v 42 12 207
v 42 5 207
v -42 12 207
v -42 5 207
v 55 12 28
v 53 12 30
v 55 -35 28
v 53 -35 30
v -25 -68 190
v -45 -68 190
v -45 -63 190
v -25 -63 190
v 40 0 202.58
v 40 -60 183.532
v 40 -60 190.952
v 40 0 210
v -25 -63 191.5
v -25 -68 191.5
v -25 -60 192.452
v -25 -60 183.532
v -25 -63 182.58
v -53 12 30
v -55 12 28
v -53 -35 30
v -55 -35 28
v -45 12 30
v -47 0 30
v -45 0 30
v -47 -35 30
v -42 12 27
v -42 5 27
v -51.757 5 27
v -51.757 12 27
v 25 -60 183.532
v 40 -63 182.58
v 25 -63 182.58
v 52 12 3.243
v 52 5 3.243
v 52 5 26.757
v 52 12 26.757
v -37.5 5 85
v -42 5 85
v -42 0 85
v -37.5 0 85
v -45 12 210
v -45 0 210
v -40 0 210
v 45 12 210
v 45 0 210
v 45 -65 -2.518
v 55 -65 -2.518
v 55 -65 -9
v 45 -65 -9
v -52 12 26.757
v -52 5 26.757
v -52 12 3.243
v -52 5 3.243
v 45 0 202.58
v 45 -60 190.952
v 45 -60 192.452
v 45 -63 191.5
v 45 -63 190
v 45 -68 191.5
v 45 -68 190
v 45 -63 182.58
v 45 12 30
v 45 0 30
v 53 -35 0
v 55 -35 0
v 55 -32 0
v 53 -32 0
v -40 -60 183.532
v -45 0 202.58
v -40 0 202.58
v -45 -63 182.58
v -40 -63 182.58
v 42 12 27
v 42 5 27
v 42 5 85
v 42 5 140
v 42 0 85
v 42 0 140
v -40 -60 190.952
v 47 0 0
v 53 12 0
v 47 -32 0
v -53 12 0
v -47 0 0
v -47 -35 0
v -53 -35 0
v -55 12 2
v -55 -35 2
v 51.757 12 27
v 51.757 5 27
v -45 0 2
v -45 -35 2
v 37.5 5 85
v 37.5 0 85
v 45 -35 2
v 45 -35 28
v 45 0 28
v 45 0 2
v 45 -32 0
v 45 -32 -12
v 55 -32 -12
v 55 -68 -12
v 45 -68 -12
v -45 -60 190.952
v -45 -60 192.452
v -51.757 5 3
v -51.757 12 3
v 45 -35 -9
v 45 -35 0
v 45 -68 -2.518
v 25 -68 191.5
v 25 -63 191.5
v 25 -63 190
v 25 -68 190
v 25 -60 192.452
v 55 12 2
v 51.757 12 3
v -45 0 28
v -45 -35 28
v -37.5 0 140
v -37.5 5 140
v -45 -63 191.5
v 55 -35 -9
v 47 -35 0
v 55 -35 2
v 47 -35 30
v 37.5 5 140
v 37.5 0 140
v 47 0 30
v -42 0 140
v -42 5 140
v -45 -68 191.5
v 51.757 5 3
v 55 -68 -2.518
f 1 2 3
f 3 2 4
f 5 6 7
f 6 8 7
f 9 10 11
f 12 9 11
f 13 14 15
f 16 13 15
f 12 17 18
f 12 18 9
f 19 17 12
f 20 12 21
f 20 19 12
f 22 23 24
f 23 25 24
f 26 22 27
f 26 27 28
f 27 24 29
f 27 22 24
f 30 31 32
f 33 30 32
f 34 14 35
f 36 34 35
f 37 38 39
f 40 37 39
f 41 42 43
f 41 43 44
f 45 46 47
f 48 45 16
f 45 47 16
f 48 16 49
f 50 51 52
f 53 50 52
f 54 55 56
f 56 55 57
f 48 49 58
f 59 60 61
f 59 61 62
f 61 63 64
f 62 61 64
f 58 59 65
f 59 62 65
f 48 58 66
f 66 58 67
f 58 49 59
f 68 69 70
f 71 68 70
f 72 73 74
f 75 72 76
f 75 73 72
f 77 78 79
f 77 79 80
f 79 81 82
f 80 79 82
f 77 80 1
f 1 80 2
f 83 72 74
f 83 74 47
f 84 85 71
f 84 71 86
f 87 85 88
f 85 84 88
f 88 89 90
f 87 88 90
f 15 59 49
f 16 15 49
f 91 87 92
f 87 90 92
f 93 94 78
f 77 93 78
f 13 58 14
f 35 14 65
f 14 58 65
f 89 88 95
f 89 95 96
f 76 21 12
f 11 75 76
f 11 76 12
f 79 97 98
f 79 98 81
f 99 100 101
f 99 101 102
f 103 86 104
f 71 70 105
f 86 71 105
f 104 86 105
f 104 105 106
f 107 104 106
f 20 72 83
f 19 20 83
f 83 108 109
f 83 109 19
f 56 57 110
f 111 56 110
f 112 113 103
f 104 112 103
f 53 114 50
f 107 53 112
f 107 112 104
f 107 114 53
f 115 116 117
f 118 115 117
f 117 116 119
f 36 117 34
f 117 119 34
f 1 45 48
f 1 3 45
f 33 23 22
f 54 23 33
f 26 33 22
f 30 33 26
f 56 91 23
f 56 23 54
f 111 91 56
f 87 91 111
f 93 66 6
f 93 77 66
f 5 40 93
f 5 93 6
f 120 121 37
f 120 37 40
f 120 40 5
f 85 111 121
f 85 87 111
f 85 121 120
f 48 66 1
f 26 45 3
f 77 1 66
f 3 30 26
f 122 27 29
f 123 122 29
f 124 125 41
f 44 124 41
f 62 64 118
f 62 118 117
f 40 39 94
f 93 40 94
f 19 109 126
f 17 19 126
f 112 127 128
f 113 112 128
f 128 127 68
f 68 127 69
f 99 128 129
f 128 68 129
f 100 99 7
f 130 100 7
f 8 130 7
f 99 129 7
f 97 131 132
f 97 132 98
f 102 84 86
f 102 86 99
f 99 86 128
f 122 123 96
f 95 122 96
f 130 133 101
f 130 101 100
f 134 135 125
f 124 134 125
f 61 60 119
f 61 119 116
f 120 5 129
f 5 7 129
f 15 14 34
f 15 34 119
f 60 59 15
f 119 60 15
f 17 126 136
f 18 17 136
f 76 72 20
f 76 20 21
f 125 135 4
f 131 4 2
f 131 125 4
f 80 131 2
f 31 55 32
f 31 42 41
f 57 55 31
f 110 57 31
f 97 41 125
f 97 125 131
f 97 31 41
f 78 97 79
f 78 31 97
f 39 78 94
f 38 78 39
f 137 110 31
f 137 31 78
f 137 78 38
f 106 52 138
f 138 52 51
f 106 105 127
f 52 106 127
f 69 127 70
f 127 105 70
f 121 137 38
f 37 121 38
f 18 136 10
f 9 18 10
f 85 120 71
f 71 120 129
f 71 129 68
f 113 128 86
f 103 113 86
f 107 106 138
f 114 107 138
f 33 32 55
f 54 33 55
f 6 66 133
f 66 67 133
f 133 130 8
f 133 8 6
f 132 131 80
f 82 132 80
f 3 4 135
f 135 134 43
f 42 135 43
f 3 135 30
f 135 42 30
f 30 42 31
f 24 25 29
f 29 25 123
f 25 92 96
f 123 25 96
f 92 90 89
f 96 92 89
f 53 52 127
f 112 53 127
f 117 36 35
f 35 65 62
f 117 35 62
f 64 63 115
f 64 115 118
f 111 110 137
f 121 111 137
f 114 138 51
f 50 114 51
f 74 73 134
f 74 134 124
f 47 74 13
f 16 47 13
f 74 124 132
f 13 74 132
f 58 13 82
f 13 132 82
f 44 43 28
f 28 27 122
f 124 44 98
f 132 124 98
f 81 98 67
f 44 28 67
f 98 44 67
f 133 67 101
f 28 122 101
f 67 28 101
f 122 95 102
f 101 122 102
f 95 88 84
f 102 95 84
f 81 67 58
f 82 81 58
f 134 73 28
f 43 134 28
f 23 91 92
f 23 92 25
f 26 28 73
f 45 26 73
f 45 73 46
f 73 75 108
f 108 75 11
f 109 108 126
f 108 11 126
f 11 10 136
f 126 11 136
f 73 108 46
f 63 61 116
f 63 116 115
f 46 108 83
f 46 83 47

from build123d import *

# Parameters (mm, degrees)
BOSS_EXTRUDE1_DEPTH = 5
SKETCH2_W           = 4.5
SKETCH2_H           = 55
CUT_EXTRUDE1_DEPTH  = 198.863589374
BOSS_EXTRUDE2_START = -5
SKETCH3_W           = 10
SKETCH3_H           = 30
BOSS_EXTRUDE2_DEPTH = 35
CHAMFER1_SIZE       = 2
SKETCH5_W           = 90
SKETCH5_H           = 5
BOSS_EXTRUDE3_DEPTH = 20
BOSS_EXTRUDE4_DEPTH = 5
BOSS_EXTRUDE5_DEPTH = 15
BOSS_EXTRUDE6_DEPTH = 20
BOSS_EXTRUDE7_DEPTH = 7
BOSS_EXTRUDE8_REACH = 248.625


with BuildPart() as part:
    # Sketch1 → Boss-Extrude1 (new body)
    with BuildSketch(Plane(origin=(0, 0, 0), x_dir=(1, 0, 0), z_dir=(0, 1, 0))):
        Polygon((-45, -30), (-45, -190), (45, -190), (45, -30), (55, -30), (55, 0), (-55, 0), (-55, -30), align=None)
    extrude(amount=BOSS_EXTRUDE1_DEPTH)

    # Sketch2 → Cut-Extrude1 (cut, through all)
    with BuildSketch(Plane(origin=(0, 5, 0), x_dir=(1, 0, 0), z_dir=(0, 1, 0))):
        with Locations((39.75, -112.5)):
            Rectangle(SKETCH2_W, SKETCH2_H)
        with Locations((-39.75, -112.5)):
            Rectangle(SKETCH2_W, SKETCH2_H)
    extrude(amount=-CUT_EXTRUDE1_DEPTH, mode=Mode.SUBTRACT)

    # Sketch3 → Boss-Extrude2 (add)
    with BuildSketch(Plane(origin=(0, 5, 0), x_dir=(1, 0, 0), z_dir=(0, 1, 0)).offset(BOSS_EXTRUDE2_START)):
        with Locations((50, -15)):
            Rectangle(SKETCH3_W, SKETCH3_H)
        with Locations((-50, -15)):
            Rectangle(SKETCH3_W, SKETCH3_H)
    extrude(amount=-BOSS_EXTRUDE2_DEPTH)

    # Chamfer1
    chamfer1_edges = [part.edges().sort_by_distance(p)[0] for p in [
        (-55, -15, 30),
        (-55, -15, 0),
        (55, -15, 0),
        (55, -15, 30),
        (45, -17.5, 30),
        (45, -17.5, 0),
        (-45, -17.5, 0),
        (-45, -17.5, 30),
    ]]
    chamfer(chamfer1_edges, length=CHAMFER1_SIZE)

    # Sketch5 → Boss-Extrude3 (add)
    with BuildSketch(Plane.XY.offset(190)):
        with Locations((0, 2.5)):
            Rectangle(SKETCH5_W, SKETCH5_H)
    extrude(amount=BOSS_EXTRUDE3_DEPTH)

    # Sketch8 → Boss-Extrude4 (add)
    with BuildSketch(Plane.ZY.offset(45)):
        Polygon((202.579910044, 0), (182.579910044, -63), (190, -63), (210, 0), align=None)
    boss_extrude4 = extrude(amount=-BOSS_EXTRUDE4_DEPTH)

    # Sketch9 → Boss-Extrude5 (add)
    with BuildSketch(Plane(origin=(-40, 0, 0), x_dir=(0, 0, -1), z_dir=(1, 0, 0))):
        Polygon((-190.952380952, -60), (-183.532290996, -60), (-182.579910044, -63), (-190, -63), align=None)
    boss_extrude5 = extrude(amount=BOSS_EXTRUDE5_DEPTH)

    # Sketch10 → Boss-Extrude6 (add)
    with BuildSketch(Plane.ZY.offset(45)):
        Polygon((190, -68), (190, -63), (190.952380952, -60), (192.452380952, -60), (191.5, -63), (191.5, -68), align=None)
    boss_extrude6 = extrude(amount=-BOSS_EXTRUDE6_DEPTH)

    # Mirror1: Boss-Extrude4, Boss-Extrude5, Boss-Extrude6 across plane
    add(boss_extrude4.mirror(Plane(origin=(0, 0, 0), x_dir=(0, 0, 1), z_dir=(1, 0, 0))))
    add(boss_extrude5.mirror(Plane(origin=(0, 0, 0), x_dir=(0, 0, 1), z_dir=(1, 0, 0))))
    add(boss_extrude6.mirror(Plane(origin=(0, 0, 0), x_dir=(0, 0, 1), z_dir=(1, 0, 0))))

    # Sketch11 → Boss-Extrude7 (add)
    with BuildSketch(Plane(origin=(0, 5, 0), x_dir=(1, 0, 0), z_dir=(0, 1, 0))):
        Polygon((45, -210), (45, -30), (53, -30), (55, -28), (55, -2), (53, 0), (-53, 0), (-55, -2), (-55, -28), (-53, -30), (-45, -30), (-45, -210), align=None)
        Polygon((51.757359313, -27), (42, -27), (42, -85), (42, -140), (42, -207), (-42, -207), (-42, -140), (-42, -85), (-42, -27), (-51.757359313, -27), (-52, -26.757359313), (-52, -3.242640687), (-51.757359313, -3), (51.757359313, -3), (52, -3.242640687), (52, -26.757359313), align=None, mode=Mode.SUBTRACT)
    extrude(amount=BOSS_EXTRUDE7_DEPTH)

    # Boss-Extrude8: up to this face of the body (flat: up to its plane)
    boss_extrude8_end = Plane(part.part.faces().sort_by_distance((45, -17.5, 15))[0])
    # Sketch12 → Boss-Extrude8 (add, up to the picked face)
    with BuildSketch(Plane(origin=(55, 0, 0), x_dir=(0, 0, -1), z_dir=(1, 0, 0)), mode=Mode.PRIVATE) as boss_extrude8_sk1:
        Polygon((0, -32), (12, -32), (12, -68), (2.5183809, -68), (2.5183809, -65), (9, -65), (9, -35), (0, -35), align=None)
    boss_extrude8_tool1 = split(extrude(boss_extrude8_sk1.sketch, amount=-BOSS_EXTRUDE8_REACH, mode=Mode.PRIVATE), bisect_by=boss_extrude8_end, keep=Keep.BOTH, mode=Mode.PRIVATE)
    add(boss_extrude8_tool1.solids().sort_by(Axis((55, -32.379473, -6), (-1, 0, 0)))[0])


solid = part.part
